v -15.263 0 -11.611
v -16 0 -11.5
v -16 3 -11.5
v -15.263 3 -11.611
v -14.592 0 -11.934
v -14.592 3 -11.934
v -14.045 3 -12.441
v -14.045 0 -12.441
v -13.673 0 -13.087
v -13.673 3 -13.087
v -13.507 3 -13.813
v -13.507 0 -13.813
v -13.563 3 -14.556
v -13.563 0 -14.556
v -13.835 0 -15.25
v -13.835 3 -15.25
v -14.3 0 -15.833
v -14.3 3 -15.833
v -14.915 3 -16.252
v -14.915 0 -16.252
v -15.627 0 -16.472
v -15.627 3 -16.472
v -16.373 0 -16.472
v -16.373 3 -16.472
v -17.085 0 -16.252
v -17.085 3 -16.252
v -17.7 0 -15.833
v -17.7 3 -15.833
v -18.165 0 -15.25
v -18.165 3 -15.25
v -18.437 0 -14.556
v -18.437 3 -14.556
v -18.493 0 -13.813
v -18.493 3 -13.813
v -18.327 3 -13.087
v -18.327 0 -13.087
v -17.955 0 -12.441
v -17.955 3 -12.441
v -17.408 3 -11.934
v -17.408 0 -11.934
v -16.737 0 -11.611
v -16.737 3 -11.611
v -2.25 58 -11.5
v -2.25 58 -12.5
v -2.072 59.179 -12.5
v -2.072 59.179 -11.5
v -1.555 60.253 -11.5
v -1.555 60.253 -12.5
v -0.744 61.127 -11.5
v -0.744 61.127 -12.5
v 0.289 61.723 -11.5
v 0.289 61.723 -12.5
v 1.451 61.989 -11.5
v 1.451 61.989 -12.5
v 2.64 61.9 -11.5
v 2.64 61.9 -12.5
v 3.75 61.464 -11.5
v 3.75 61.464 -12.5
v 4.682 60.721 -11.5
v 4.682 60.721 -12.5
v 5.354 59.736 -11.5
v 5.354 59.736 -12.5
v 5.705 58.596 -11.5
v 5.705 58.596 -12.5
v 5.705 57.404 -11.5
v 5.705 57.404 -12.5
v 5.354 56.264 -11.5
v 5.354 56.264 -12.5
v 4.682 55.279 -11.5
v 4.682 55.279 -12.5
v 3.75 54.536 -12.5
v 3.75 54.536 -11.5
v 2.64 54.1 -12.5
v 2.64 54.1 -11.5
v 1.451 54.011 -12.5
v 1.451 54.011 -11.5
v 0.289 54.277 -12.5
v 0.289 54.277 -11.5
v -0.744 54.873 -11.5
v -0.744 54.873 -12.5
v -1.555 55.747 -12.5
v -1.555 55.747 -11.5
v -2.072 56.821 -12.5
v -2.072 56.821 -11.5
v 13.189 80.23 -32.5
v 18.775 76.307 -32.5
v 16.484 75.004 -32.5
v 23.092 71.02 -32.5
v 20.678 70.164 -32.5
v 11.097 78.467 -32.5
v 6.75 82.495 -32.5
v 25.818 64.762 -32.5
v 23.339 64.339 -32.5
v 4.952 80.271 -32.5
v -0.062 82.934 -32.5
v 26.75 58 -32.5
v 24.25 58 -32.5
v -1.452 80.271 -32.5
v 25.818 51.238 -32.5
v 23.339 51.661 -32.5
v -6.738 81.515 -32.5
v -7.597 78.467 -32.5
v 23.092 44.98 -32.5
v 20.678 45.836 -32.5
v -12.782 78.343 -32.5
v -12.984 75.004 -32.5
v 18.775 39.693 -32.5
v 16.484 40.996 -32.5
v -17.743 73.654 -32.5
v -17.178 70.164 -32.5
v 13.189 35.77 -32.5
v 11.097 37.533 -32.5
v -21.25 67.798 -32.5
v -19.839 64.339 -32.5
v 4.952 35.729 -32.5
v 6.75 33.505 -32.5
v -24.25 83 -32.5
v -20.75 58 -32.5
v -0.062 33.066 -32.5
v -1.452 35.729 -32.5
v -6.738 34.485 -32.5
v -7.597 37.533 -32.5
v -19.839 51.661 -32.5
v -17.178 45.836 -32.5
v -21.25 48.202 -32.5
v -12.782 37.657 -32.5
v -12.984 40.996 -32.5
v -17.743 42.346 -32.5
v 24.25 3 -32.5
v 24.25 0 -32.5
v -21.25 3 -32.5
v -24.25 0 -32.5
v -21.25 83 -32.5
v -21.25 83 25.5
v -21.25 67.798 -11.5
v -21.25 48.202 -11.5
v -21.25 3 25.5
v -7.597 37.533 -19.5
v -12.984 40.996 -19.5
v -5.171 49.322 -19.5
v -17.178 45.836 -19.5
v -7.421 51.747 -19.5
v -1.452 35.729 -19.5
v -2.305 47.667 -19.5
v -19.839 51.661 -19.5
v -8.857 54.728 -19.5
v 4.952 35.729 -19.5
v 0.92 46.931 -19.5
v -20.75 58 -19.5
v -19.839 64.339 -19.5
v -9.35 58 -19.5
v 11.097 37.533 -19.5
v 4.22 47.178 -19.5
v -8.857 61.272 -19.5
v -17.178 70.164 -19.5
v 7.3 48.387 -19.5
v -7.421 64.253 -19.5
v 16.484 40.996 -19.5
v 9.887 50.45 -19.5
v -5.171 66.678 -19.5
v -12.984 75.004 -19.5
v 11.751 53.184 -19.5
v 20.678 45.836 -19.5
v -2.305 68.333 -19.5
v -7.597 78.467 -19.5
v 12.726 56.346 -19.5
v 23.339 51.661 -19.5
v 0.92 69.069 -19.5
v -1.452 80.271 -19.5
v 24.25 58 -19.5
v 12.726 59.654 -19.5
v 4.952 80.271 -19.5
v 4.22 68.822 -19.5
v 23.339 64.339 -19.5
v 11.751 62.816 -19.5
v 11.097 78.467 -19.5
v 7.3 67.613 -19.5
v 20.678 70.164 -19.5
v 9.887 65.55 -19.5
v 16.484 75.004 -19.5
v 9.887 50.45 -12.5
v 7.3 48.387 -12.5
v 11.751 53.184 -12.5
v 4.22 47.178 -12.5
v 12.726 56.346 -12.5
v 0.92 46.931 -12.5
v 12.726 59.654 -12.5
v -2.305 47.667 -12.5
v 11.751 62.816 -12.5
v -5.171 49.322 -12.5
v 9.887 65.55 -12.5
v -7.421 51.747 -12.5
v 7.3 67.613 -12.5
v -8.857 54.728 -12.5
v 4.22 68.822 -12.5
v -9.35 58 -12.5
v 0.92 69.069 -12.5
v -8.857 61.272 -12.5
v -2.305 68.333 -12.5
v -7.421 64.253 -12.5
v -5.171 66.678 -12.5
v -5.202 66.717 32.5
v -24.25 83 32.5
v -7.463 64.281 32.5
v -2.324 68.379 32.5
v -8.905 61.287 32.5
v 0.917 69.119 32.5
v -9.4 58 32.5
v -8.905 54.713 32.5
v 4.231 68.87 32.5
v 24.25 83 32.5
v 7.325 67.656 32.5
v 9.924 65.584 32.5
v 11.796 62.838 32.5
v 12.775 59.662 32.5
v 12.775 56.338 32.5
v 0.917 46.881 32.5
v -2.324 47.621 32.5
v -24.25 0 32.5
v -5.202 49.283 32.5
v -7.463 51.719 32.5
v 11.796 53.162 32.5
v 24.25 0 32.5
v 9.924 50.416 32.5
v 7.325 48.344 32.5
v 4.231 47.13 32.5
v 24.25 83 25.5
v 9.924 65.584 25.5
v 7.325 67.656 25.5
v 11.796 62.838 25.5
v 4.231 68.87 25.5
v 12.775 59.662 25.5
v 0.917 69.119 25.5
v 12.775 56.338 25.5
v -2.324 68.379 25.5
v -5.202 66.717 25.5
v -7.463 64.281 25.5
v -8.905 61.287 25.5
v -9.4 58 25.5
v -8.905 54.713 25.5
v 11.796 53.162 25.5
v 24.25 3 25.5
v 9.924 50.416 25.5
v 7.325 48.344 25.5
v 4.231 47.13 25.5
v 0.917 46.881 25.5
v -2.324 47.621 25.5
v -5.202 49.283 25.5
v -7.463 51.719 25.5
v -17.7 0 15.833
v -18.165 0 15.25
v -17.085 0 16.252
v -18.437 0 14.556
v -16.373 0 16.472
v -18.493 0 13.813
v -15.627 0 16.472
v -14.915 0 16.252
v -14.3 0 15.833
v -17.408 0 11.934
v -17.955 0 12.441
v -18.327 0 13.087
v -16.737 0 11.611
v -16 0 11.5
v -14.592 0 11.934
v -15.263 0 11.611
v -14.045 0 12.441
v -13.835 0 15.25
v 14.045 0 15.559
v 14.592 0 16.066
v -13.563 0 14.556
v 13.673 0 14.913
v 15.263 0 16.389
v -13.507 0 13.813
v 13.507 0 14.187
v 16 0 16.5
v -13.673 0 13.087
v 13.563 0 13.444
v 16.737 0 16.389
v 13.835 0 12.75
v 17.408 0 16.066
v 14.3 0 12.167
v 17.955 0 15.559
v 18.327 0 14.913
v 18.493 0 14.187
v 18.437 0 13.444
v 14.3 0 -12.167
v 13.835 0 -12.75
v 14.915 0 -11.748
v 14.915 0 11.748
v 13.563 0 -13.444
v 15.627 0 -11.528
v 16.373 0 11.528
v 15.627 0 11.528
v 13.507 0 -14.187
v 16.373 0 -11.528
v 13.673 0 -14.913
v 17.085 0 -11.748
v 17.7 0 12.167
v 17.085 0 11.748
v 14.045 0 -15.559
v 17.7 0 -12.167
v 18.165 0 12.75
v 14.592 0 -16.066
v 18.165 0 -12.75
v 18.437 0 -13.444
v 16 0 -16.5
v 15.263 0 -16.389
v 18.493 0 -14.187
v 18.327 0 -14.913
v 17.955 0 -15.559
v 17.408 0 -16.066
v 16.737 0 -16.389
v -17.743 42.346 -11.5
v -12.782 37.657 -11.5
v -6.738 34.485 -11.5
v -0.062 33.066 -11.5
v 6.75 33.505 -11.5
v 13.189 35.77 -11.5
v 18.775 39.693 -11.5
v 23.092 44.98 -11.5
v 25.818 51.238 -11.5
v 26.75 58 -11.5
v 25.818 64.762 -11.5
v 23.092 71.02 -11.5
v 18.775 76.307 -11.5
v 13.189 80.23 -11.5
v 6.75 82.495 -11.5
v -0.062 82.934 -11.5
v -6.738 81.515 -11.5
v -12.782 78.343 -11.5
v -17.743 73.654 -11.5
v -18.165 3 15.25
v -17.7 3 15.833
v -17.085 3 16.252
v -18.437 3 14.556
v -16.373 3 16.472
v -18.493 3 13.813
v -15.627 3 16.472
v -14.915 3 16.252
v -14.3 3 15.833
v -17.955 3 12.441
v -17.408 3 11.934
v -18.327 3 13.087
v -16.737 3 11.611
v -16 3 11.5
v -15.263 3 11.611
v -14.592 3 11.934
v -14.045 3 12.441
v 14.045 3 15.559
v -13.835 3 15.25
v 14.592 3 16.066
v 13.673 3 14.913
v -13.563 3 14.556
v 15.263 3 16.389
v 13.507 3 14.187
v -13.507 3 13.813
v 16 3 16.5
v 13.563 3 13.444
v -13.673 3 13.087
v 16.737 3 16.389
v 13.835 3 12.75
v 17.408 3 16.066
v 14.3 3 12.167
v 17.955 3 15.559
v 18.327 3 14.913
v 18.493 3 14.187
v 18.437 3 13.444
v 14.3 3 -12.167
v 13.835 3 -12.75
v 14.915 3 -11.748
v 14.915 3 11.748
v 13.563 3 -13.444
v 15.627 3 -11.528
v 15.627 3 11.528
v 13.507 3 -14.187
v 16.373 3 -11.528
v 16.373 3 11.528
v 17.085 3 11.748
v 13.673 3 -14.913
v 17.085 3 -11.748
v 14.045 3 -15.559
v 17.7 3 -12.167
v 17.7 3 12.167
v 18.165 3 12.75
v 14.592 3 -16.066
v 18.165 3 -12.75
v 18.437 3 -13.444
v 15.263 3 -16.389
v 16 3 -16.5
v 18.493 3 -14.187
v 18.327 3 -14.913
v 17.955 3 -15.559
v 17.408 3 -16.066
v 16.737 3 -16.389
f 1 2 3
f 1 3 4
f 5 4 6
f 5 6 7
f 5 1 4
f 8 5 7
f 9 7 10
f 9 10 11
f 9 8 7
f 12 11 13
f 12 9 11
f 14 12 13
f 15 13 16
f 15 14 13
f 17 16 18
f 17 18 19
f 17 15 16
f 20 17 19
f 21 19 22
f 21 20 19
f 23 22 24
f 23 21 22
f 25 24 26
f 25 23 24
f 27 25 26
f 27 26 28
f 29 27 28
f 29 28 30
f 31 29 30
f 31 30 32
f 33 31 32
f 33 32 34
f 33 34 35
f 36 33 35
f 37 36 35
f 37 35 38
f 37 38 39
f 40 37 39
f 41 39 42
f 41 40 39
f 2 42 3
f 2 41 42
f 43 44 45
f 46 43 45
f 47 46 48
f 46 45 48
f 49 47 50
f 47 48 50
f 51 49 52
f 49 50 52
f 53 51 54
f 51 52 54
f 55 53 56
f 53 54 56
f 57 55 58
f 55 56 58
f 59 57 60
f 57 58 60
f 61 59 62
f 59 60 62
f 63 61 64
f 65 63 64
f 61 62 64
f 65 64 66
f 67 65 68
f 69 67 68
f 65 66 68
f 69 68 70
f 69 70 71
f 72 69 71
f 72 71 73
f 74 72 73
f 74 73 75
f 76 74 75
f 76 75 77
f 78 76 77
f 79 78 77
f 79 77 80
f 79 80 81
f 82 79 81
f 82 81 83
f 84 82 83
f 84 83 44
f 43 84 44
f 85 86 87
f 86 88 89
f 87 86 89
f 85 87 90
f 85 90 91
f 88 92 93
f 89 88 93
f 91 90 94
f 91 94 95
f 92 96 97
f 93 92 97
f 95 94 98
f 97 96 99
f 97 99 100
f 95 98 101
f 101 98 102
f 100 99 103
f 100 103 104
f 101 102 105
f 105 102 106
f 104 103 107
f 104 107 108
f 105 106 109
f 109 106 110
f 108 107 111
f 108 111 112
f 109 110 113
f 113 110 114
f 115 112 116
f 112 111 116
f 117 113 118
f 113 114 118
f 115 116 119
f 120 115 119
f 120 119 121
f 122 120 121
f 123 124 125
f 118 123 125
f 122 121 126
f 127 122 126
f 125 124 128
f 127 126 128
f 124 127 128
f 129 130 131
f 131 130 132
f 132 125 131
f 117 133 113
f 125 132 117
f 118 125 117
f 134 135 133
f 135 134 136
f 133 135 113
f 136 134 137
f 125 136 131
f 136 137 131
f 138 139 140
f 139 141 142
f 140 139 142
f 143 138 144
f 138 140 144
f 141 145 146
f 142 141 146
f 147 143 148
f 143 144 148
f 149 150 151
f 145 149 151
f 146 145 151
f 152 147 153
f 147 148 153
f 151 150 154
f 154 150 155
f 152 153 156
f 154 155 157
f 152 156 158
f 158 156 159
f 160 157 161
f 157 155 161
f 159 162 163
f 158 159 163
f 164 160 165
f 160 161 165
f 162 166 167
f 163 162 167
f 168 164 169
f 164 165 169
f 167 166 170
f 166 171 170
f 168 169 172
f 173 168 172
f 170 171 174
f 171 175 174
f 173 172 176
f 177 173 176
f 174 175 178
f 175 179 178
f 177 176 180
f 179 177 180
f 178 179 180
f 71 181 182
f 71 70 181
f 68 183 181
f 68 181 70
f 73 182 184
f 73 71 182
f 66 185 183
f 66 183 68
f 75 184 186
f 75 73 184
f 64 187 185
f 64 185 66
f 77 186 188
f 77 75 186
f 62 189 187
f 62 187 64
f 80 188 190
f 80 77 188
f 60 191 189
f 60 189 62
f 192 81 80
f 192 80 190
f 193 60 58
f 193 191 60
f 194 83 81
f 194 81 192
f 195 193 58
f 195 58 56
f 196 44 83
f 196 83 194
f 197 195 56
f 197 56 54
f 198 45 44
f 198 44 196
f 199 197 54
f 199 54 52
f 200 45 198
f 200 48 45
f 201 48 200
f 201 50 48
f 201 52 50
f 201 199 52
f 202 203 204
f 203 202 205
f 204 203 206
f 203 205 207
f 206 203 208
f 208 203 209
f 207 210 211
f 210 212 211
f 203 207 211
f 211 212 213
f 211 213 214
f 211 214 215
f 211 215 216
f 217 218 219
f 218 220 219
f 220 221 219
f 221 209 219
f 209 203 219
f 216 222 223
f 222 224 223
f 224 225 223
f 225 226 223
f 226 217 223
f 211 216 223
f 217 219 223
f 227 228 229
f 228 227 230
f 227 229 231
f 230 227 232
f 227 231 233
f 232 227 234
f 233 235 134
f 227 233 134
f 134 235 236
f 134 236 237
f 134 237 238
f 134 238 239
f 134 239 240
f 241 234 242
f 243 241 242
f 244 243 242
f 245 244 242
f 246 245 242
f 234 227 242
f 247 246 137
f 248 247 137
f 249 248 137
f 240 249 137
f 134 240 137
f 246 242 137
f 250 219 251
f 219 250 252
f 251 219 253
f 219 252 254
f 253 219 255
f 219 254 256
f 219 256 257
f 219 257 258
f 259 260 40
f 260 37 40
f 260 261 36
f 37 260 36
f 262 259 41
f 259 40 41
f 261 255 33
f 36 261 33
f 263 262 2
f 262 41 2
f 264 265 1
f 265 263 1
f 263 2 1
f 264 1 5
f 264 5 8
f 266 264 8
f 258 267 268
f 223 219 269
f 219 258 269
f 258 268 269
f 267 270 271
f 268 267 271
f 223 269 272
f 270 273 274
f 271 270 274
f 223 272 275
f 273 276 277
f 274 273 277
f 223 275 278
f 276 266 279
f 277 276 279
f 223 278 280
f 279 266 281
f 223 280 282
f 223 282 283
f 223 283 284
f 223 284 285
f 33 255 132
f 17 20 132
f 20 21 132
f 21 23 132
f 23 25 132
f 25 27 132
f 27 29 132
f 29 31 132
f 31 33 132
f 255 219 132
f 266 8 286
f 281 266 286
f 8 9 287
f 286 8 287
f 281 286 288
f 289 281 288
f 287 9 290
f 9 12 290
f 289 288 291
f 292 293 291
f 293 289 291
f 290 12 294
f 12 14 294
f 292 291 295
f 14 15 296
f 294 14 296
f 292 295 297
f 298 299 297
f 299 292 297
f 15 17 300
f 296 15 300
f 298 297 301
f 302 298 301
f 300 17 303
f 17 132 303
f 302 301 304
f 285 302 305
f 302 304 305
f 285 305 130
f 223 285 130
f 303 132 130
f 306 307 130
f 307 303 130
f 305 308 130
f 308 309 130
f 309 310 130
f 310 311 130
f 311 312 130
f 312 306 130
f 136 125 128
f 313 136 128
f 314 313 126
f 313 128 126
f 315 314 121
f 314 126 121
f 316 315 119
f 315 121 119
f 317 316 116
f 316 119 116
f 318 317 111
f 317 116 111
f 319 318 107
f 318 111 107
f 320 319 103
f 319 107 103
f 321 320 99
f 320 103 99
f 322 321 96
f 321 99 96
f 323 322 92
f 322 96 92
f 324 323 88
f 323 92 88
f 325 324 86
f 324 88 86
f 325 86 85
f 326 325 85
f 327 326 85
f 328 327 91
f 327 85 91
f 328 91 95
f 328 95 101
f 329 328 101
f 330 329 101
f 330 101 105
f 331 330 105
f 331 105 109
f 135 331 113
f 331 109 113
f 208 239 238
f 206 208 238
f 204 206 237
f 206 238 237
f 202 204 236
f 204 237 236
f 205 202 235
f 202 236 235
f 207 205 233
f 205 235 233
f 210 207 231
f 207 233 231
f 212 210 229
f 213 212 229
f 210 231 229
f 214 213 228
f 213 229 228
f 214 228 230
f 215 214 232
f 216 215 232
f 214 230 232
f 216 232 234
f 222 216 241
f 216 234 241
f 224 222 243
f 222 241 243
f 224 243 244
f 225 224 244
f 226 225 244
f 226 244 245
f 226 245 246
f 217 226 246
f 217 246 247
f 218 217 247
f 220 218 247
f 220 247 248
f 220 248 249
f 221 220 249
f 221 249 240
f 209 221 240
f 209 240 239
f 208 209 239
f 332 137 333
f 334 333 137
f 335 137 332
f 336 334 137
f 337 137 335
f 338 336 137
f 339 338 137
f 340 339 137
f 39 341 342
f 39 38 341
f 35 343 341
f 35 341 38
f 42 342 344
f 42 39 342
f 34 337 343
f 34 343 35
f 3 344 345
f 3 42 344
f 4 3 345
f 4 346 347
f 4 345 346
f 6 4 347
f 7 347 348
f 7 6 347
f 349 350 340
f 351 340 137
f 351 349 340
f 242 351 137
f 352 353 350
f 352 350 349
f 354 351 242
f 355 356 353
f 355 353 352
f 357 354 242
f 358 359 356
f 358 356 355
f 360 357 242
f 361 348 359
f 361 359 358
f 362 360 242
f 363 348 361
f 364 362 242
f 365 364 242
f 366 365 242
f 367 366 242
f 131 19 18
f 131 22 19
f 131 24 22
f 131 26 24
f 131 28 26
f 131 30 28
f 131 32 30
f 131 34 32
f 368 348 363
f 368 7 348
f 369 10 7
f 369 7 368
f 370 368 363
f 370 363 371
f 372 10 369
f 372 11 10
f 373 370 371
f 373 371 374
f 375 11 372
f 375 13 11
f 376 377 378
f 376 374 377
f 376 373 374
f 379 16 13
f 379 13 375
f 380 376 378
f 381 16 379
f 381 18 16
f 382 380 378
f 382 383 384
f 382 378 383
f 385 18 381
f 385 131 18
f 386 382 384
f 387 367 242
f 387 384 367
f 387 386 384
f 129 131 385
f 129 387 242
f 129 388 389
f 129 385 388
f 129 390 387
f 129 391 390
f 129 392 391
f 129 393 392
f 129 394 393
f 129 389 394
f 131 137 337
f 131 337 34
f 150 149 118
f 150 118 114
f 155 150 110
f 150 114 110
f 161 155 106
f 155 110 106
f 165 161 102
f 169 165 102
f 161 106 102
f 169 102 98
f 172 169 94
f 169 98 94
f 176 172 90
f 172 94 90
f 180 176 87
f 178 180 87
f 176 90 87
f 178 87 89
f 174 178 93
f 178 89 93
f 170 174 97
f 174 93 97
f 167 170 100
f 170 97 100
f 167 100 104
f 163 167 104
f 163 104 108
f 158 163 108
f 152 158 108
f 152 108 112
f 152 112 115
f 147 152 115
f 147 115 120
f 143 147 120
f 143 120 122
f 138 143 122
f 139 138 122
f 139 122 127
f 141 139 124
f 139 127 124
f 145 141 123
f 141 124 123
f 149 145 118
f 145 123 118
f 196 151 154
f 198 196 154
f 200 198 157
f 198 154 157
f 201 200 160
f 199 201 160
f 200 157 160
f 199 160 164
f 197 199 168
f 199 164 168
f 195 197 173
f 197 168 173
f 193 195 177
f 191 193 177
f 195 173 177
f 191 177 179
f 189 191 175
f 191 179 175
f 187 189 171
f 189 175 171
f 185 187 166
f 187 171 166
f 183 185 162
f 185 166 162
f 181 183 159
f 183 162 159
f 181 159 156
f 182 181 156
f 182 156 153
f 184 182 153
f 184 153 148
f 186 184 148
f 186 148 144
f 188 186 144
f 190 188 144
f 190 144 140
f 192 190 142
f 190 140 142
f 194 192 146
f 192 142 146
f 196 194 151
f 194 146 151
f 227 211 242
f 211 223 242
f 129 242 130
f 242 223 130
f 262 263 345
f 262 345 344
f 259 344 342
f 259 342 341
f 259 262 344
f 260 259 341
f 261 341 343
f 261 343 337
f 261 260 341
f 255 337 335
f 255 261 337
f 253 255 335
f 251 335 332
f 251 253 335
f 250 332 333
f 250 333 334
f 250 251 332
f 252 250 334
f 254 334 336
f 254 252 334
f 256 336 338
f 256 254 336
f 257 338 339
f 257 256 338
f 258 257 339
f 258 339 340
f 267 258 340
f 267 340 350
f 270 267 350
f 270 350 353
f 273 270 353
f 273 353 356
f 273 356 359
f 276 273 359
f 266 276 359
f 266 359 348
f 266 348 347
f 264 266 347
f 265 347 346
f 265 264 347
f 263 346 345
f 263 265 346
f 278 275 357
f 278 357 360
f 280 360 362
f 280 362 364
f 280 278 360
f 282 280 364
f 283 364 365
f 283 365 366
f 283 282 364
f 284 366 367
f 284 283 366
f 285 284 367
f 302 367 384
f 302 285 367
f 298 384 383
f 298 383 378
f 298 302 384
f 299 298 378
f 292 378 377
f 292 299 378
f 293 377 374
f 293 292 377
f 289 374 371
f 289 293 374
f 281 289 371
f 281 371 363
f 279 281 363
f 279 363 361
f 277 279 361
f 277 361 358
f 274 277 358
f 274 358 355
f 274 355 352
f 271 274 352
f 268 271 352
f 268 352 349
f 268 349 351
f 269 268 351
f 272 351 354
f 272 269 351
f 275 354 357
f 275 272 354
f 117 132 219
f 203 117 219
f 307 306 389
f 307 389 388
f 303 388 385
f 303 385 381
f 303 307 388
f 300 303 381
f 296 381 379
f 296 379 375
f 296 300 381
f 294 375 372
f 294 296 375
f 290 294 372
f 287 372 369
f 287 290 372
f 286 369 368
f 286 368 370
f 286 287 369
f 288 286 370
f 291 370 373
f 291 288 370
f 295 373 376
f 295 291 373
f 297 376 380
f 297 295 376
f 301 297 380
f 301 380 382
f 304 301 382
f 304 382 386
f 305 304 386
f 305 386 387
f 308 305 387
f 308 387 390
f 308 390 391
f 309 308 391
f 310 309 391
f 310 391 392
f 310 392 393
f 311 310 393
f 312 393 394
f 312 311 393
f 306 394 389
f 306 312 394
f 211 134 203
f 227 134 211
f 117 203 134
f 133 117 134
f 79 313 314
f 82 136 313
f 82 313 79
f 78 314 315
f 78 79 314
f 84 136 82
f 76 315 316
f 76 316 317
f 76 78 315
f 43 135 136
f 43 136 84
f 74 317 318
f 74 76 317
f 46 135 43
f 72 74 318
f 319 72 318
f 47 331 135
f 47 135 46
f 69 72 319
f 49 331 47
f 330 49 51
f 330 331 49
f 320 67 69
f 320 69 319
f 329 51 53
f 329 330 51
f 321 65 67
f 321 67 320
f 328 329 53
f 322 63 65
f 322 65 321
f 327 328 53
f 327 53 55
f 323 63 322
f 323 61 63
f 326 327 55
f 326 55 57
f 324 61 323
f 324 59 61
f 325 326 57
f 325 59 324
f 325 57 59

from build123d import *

# Parameters (mm, degrees)
SKETCH2_W           = 48.5
SKETCH2_H           = 65
SKETCH2_R           = 2.5
BOSS_EXTRUDE1_DEPTH = 3
BOSS_EXTRUDE2_DEPTH = 80
SKETCH6_R           = 22.5
BOSS_EXTRUDE3_DEPTH = 13
BOSS_EXTRUDE4_DEPTH = 8
SKETCH12_R          = 11.1
CUT_EXTRUDE1_DEPTH  = 7
SKETCH13_R          = 4
CUT_EXTRUDE2_DEPTH  = 78
SKETCH14_R          = 11.15
CUT_EXTRUDE3_DEPTH  = 10


with BuildPart() as part:
    # Sketch2 → Boss-Extrude1 (new body)
    with BuildSketch(Plane(origin=(0, 0, 0), x_dir=(1, 0, 0), z_dir=(0, 1, 0))):
        Rectangle(SKETCH2_W, SKETCH2_H)
        with Locations(Location((-16, 14, 0), (0, 0, 270))):
            Circle(SKETCH2_R, mode=Mode.SUBTRACT)
        with Locations(Location((16, 14, 0), (0, 0, 90))):
            Circle(SKETCH2_R, mode=Mode.SUBTRACT)
        with Locations(Location((16, -14, 0), (0, 0, 270))):
            Circle(SKETCH2_R, mode=Mode.SUBTRACT)
        with Locations(Location((-16, -14, 0), (0, 0, 90))):
            Circle(SKETCH2_R, mode=Mode.SUBTRACT)
    extrude(amount=BOSS_EXTRUDE1_DEPTH)

    # Sketch3 → Boss-Extrude2 (add)
    with BuildSketch(Plane(origin=(0, 3, 0), x_dir=(1, 0, 0), z_dir=(0, 1, 0))):
        Polygon((-24.25, 32.5), (-24.25, -32.5), (24.25, -32.5), (24.25, -25.5), (-21.25, -25.5), (-21.25, 32.5), align=None)
    extrude(amount=BOSS_EXTRUDE2_DEPTH)

    # Sketch6 → Boss-Extrude3 (add)
    with BuildSketch(Plane(origin=(0, 0, -32.5), x_dir=(-1, 0, 0), z_dir=(0, 0, -1))):
        with BuildLine():
            Line((21.25, 67.797958971), (21.25, 48.202041029))
            ThreePointArc((21.25, 48.202041029), (-26.75, 58), (21.25, 67.797958971))
        make_face()
        with Locations((-1.75, 58)):
            Circle(SKETCH6_R, mode=Mode.SUBTRACT)
    extrude(amount=-BOSS_EXTRUDE3_DEPTH)

    # Sketch10 → Boss-Extrude4 (add)
    with BuildSketch(Plane.XY.offset(-19.5)):
        with BuildLine():
            Line((-21.25, 67.797958971), (-21.25, 48.202041029))
            ThreePointArc((-21.25, 48.202041029), (26.75, 58), (-21.25, 67.797958971))
        make_face()
    extrude(amount=BOSS_EXTRUDE4_DEPTH)

    # Sketch12 → Cut-Extrude1 (cut)
    with BuildSketch(Plane(origin=(0, 0, -19.5), x_dir=(-1, 0, 0), z_dir=(0, 0, -1))):
        with Locations((-1.75, 58)):
            Circle(SKETCH12_R)
    extrude(amount=-CUT_EXTRUDE1_DEPTH, mode=Mode.SUBTRACT)

    # Sketch13 → Cut-Extrude2 (cut)
    with BuildSketch(Plane(origin=(0, 0, -12.5), x_dir=(-1, 0, 0), z_dir=(0, 0, -1))):
        with Locations((-1.75, 58)):
            Circle(SKETCH13_R)
    extrude(amount=-CUT_EXTRUDE2_DEPTH, mode=Mode.SUBTRACT)

    # Sketch14 → Cut-Extrude3 (cut)
    with BuildSketch(Plane(origin=(0, 0, 25.5), x_dir=(-1, 0, 0), z_dir=(0, 0, -1))):
        with Locations((-1.75, 58)):
            Circle(SKETCH14_R)
    extrude(amount=-CUT_EXTRUDE3_DEPTH, mode=Mode.SUBTRACT)


solid = part.part
